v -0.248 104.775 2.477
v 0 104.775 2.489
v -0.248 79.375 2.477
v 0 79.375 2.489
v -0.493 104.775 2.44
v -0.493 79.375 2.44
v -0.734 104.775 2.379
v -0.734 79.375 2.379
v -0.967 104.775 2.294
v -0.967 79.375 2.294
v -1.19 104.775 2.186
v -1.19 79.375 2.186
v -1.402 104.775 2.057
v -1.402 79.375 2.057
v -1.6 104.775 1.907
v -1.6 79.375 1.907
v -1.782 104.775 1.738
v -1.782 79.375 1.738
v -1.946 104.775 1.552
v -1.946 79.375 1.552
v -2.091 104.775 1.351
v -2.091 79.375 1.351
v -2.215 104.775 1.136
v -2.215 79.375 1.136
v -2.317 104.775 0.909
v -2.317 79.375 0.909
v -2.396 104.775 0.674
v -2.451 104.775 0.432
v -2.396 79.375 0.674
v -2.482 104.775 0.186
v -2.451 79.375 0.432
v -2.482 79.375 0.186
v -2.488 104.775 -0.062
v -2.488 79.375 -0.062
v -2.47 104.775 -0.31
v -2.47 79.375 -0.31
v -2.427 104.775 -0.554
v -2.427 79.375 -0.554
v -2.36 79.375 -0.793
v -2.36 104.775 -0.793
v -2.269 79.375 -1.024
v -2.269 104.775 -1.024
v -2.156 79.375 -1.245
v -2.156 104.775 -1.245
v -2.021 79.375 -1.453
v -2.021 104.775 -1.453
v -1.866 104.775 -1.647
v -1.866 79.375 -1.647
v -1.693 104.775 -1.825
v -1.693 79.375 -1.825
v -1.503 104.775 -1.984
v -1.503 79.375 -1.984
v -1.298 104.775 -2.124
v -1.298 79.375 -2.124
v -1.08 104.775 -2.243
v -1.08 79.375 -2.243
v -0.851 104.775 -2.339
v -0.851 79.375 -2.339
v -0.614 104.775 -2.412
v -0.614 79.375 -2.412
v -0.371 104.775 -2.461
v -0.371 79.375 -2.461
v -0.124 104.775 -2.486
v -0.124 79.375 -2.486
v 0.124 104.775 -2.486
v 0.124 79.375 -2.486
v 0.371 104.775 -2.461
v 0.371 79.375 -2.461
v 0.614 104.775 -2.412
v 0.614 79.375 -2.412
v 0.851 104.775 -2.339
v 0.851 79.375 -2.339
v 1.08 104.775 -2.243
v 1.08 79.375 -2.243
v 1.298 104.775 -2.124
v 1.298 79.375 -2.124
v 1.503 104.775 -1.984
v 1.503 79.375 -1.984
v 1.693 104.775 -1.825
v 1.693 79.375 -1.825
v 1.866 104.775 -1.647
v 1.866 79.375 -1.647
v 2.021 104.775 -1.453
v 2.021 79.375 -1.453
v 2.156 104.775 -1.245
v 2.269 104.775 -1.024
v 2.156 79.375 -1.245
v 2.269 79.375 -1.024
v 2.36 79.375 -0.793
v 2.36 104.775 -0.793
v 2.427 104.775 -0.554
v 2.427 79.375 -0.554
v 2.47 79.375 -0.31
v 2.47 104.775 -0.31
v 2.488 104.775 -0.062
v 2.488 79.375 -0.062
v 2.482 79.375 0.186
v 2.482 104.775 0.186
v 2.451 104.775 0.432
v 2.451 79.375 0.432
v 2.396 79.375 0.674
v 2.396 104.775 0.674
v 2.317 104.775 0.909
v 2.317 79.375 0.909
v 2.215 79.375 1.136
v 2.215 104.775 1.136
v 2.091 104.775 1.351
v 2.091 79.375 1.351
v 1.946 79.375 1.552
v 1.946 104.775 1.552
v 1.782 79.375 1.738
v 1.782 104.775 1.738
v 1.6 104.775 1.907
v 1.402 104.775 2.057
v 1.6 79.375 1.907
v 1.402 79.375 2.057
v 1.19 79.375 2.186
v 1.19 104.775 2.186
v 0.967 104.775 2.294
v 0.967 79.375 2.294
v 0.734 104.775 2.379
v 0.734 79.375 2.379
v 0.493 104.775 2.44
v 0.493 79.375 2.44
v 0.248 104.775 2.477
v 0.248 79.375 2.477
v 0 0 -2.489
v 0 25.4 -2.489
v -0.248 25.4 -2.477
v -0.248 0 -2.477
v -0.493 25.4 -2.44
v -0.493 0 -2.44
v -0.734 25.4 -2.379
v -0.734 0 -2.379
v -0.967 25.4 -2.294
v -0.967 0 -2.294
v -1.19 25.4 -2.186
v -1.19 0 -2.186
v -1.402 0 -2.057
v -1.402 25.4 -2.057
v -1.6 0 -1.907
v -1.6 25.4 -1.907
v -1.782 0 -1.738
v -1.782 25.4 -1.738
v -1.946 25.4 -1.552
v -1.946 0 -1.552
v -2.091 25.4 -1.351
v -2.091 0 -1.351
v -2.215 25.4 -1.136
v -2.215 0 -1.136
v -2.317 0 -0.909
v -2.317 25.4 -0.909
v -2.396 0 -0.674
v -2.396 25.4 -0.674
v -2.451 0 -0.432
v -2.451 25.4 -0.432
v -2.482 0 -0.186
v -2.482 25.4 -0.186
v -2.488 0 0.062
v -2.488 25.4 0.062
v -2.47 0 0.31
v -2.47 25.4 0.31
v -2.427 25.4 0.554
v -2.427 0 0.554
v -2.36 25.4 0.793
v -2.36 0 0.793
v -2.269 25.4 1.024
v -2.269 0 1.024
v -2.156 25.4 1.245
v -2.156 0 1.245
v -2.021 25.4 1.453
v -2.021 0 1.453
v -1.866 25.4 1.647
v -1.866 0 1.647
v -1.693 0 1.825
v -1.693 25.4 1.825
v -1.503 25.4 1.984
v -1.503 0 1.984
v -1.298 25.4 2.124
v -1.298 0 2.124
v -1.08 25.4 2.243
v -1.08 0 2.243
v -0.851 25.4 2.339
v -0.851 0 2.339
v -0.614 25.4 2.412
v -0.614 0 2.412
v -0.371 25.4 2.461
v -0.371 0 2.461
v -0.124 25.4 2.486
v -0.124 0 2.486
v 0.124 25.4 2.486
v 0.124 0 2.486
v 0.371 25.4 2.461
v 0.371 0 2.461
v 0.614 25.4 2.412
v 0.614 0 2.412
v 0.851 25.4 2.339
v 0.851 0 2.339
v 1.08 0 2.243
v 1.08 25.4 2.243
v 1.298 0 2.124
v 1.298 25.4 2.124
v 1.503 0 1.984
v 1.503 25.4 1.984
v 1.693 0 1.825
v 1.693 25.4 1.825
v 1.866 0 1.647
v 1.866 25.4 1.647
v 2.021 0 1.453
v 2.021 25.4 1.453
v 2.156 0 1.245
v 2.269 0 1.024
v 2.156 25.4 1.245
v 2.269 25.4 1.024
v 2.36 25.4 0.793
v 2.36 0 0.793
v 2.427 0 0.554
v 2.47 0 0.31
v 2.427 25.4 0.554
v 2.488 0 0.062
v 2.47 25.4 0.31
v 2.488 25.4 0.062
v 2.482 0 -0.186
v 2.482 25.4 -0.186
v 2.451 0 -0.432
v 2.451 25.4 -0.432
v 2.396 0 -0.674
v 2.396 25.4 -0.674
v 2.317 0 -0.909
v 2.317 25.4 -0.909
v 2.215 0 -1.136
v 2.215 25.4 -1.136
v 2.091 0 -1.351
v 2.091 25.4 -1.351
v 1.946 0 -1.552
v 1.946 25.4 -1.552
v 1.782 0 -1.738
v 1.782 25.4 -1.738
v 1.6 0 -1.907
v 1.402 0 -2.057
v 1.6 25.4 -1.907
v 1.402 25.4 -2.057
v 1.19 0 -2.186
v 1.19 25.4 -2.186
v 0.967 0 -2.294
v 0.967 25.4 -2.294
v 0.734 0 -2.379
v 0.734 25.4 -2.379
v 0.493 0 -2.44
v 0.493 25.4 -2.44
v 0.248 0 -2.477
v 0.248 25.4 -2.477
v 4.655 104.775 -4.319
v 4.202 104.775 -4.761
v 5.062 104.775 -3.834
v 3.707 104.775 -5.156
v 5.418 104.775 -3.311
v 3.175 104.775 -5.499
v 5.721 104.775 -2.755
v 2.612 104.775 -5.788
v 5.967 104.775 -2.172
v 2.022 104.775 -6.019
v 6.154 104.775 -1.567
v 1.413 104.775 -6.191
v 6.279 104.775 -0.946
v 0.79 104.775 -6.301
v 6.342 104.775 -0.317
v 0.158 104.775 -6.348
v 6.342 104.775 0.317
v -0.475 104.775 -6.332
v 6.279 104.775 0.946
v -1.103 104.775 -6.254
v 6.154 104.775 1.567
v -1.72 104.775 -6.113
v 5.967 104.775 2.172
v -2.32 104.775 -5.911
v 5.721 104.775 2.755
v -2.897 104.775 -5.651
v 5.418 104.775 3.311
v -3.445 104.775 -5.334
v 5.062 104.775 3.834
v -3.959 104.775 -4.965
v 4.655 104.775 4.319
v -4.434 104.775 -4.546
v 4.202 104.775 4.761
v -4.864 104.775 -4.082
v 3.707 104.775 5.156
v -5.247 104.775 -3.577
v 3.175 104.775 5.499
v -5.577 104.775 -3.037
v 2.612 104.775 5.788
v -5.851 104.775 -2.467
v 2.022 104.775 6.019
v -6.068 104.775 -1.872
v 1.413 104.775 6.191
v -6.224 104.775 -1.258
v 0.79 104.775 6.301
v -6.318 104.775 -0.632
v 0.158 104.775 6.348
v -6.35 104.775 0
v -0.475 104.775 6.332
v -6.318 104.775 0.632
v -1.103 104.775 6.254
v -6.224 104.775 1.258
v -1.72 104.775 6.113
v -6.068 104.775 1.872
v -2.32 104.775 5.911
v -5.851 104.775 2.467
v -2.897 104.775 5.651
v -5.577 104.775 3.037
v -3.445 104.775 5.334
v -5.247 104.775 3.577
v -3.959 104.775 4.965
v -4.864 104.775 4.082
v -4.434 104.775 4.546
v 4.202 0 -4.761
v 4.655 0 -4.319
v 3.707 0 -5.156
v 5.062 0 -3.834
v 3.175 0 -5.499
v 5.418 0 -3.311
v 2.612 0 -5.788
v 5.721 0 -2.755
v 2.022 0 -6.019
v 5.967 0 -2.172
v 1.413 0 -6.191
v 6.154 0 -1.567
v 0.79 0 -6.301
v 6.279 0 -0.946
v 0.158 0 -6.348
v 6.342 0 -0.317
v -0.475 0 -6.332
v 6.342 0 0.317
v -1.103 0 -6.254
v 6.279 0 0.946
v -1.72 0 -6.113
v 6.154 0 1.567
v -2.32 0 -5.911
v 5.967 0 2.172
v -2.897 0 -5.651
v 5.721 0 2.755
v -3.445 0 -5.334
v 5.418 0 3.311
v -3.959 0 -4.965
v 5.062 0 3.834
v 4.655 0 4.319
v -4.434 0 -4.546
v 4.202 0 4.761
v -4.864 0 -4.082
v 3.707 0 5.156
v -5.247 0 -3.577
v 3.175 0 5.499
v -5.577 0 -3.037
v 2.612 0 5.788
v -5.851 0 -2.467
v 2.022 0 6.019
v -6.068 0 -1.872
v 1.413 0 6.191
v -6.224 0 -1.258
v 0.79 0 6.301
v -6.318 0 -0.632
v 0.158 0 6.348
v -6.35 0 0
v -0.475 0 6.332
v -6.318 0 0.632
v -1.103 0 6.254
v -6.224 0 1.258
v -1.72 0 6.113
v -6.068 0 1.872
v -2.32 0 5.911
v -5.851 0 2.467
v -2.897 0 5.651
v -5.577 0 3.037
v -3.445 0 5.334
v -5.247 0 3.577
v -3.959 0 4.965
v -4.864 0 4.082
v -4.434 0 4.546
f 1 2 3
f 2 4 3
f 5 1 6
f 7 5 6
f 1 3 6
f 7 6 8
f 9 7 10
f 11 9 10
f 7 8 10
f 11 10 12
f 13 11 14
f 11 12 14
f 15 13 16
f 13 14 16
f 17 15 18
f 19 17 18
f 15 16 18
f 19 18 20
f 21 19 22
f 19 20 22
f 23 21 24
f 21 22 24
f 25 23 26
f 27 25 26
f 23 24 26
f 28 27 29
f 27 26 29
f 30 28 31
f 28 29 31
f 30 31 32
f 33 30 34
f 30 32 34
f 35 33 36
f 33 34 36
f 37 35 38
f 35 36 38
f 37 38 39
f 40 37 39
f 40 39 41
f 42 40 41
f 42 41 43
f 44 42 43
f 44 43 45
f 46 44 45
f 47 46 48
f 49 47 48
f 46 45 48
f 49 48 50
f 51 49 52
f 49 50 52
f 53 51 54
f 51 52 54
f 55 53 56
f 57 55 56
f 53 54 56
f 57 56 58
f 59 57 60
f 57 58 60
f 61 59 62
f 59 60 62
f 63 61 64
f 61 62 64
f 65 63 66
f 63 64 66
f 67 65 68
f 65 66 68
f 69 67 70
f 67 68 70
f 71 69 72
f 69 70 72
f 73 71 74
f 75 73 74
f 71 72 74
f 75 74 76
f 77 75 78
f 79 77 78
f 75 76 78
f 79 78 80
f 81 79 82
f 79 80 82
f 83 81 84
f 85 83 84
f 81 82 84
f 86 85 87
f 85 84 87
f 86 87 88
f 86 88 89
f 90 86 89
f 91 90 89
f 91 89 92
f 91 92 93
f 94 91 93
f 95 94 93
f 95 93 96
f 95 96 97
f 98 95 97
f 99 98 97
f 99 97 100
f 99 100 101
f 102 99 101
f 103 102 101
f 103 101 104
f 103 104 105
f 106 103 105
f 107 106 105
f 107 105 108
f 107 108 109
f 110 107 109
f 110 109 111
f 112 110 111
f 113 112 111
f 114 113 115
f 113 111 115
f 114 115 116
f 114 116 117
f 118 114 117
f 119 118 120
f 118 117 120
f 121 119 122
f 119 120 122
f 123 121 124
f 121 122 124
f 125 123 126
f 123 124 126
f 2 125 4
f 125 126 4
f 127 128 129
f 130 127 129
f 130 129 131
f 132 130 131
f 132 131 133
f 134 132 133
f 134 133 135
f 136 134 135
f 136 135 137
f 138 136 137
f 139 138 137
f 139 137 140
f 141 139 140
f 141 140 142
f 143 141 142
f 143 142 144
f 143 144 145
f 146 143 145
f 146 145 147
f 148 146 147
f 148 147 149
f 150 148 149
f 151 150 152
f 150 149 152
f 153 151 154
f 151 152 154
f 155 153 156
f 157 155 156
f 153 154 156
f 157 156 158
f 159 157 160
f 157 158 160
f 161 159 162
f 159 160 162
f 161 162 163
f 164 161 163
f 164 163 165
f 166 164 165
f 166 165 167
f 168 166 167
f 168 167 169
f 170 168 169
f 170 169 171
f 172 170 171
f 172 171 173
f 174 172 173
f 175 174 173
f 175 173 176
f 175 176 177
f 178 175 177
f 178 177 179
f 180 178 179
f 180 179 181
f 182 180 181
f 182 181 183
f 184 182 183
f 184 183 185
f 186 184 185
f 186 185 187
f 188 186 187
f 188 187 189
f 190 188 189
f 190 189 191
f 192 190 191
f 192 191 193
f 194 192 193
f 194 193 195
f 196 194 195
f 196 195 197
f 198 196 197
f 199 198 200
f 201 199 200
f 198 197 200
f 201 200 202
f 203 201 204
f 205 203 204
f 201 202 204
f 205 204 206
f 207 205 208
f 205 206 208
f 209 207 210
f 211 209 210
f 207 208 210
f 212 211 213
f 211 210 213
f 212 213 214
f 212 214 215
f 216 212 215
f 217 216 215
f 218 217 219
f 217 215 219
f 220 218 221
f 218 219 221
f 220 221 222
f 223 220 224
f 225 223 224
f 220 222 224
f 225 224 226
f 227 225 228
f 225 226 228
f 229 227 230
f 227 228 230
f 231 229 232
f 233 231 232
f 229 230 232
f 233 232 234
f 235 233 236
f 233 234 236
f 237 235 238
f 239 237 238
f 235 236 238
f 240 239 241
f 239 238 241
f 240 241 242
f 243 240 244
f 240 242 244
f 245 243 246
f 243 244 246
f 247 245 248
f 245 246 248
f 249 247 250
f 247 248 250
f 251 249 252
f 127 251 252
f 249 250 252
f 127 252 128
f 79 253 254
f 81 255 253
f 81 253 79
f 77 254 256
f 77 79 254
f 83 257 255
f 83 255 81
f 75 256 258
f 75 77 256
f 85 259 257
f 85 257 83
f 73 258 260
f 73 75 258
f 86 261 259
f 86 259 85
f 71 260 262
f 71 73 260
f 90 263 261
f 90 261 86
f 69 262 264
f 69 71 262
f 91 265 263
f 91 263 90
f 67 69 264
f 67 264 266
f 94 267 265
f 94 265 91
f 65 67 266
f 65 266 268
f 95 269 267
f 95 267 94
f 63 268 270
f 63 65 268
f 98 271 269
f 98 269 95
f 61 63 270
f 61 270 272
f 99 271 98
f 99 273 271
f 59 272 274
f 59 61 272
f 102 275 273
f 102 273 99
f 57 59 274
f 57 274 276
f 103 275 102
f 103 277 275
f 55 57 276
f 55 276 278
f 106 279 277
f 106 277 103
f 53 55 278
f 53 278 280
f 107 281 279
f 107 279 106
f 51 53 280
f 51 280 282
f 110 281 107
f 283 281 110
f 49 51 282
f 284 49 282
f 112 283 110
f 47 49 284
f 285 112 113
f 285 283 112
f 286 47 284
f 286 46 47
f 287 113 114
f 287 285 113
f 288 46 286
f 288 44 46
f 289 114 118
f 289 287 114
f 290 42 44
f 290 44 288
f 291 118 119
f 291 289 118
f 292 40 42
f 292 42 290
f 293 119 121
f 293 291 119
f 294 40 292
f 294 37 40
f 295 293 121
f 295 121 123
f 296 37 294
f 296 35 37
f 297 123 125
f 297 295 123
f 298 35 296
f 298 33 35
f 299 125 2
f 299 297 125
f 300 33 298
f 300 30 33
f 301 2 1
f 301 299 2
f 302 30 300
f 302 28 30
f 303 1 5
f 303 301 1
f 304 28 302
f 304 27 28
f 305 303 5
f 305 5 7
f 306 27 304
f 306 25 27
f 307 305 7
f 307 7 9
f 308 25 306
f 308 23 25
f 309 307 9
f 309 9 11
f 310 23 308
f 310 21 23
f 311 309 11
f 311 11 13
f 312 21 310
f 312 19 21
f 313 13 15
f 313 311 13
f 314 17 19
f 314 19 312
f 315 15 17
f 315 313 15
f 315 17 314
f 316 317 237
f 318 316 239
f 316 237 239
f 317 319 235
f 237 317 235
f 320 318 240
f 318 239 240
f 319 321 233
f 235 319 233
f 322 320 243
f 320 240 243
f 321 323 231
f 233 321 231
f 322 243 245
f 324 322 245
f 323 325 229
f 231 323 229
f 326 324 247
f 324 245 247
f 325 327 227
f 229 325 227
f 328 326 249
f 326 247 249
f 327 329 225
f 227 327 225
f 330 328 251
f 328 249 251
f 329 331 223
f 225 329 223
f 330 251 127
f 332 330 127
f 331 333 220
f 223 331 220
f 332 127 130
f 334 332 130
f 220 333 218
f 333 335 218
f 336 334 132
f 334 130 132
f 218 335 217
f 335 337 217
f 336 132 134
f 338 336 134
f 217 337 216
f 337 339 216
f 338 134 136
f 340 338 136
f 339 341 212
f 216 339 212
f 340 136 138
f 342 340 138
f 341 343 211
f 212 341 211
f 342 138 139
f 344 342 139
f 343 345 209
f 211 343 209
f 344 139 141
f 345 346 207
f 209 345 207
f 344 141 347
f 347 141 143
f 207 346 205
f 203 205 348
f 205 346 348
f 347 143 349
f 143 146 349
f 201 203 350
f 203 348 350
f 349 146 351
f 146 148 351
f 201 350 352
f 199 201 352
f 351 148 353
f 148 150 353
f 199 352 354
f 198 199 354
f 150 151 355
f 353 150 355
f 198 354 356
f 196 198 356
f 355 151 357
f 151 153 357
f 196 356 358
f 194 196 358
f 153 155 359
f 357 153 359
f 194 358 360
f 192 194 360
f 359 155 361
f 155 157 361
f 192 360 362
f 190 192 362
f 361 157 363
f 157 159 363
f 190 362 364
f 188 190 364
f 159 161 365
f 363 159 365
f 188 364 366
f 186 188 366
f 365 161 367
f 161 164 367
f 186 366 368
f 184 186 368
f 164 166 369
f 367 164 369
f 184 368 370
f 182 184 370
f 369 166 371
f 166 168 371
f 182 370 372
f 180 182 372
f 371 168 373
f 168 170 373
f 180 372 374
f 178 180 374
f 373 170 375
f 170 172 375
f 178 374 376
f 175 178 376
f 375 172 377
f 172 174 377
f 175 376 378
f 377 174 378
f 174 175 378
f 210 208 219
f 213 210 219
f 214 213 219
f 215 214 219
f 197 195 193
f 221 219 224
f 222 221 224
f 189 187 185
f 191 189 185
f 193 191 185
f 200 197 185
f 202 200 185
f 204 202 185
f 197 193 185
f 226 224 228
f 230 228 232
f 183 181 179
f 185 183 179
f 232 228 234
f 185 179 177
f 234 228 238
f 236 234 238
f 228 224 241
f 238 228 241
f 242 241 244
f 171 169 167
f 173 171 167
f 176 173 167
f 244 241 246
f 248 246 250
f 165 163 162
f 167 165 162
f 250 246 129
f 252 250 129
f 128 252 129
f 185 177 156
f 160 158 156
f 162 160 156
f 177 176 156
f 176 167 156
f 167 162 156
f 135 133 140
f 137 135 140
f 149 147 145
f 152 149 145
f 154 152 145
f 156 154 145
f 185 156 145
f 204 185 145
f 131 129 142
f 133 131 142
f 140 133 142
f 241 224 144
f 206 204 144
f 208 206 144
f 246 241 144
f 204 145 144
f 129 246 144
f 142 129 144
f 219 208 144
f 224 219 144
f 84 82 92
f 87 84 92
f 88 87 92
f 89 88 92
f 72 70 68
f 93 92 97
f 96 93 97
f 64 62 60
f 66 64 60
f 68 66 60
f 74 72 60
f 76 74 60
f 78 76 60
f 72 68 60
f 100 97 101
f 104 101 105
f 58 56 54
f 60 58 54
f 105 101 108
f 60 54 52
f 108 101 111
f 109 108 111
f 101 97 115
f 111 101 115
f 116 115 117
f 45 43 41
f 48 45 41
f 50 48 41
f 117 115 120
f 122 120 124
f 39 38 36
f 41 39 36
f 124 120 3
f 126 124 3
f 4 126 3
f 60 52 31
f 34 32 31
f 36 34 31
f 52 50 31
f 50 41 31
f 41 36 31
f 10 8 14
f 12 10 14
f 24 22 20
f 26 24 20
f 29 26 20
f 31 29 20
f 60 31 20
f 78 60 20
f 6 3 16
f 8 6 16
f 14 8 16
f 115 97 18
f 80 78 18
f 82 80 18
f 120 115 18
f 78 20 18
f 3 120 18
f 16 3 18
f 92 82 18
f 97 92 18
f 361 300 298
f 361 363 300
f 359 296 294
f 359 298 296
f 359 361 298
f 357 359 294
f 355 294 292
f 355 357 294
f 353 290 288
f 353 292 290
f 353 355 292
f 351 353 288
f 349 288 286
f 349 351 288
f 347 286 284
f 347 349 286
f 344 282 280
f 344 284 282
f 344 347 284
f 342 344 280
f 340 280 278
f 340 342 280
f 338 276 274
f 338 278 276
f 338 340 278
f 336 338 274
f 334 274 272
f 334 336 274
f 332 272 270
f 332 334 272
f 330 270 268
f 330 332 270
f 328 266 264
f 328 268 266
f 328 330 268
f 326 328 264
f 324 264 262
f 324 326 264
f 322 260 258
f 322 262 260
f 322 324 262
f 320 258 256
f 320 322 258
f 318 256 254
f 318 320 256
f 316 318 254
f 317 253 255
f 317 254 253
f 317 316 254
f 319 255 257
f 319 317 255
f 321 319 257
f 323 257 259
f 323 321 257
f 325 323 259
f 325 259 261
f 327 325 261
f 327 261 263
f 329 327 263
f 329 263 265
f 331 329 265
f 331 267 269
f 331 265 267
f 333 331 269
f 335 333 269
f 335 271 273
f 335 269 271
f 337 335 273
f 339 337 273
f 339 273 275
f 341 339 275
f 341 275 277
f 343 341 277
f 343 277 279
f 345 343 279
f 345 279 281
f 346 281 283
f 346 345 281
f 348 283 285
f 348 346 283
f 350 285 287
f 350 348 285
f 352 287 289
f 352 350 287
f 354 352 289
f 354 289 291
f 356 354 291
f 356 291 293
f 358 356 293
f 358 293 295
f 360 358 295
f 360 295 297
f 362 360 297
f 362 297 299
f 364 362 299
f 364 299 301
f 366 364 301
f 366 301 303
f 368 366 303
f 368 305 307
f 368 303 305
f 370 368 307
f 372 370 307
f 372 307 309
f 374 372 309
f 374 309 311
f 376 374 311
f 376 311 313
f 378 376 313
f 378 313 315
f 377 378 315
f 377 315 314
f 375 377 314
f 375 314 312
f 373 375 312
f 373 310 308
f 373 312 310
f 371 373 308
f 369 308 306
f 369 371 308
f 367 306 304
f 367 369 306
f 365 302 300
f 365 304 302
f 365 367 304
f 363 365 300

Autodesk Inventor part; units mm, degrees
ref_plane "YZ Plane" through (0, 0, 0) normal (1, 0, 0) x (0, 1, 0)
ref_plane "XZ Plane" through (0, 0, 0) normal (0, 1, 0) x (-1, 0, 0)
ref_plane "XY Plane" through (0, 0, 0) normal (0, 0, 1) x (1, 0, 0)
sketch "Sketch1" plane through (0, 0, 0) normal (0, 1, 0) x (-1, 0, 0)
  circle A0 centre (0, 0) radius 6.35
  dimension "d0" = 12.7
extrude "Extrusion1" add sketch "Sketch1" along normal blind 104.775
sketch "Sketch2" plane through (0, 0, 0) normal (0, -1, 0) x (1, 0, 0)
  point P0 (0, 0)
  point P1 (0, 0)
hole "Hole1" at (0, 0, 0) direction (0, 1, 0) diameter 4.9784 depth 25.4 thread size "1/4-20 UNC" class "2B" standard "ANSI Unified Screw Threads"
sketch "Sketch3" plane through (0, 104.775, 0) normal (0, 1, 0) x (1, 0, 0)
  point P0 (0, 0)
  point P1 (0, 0)
hole "Hole2" at (0, 104.775, 0) direction (0, -1, 0) diameter 4.9784 depth 25.4 thread size "1/4-20 UNC" class "2B" standard "ANSI Unified Screw Threads"
properties part number "SHOT_020_Spacer7" material "Aluminum 6061"
